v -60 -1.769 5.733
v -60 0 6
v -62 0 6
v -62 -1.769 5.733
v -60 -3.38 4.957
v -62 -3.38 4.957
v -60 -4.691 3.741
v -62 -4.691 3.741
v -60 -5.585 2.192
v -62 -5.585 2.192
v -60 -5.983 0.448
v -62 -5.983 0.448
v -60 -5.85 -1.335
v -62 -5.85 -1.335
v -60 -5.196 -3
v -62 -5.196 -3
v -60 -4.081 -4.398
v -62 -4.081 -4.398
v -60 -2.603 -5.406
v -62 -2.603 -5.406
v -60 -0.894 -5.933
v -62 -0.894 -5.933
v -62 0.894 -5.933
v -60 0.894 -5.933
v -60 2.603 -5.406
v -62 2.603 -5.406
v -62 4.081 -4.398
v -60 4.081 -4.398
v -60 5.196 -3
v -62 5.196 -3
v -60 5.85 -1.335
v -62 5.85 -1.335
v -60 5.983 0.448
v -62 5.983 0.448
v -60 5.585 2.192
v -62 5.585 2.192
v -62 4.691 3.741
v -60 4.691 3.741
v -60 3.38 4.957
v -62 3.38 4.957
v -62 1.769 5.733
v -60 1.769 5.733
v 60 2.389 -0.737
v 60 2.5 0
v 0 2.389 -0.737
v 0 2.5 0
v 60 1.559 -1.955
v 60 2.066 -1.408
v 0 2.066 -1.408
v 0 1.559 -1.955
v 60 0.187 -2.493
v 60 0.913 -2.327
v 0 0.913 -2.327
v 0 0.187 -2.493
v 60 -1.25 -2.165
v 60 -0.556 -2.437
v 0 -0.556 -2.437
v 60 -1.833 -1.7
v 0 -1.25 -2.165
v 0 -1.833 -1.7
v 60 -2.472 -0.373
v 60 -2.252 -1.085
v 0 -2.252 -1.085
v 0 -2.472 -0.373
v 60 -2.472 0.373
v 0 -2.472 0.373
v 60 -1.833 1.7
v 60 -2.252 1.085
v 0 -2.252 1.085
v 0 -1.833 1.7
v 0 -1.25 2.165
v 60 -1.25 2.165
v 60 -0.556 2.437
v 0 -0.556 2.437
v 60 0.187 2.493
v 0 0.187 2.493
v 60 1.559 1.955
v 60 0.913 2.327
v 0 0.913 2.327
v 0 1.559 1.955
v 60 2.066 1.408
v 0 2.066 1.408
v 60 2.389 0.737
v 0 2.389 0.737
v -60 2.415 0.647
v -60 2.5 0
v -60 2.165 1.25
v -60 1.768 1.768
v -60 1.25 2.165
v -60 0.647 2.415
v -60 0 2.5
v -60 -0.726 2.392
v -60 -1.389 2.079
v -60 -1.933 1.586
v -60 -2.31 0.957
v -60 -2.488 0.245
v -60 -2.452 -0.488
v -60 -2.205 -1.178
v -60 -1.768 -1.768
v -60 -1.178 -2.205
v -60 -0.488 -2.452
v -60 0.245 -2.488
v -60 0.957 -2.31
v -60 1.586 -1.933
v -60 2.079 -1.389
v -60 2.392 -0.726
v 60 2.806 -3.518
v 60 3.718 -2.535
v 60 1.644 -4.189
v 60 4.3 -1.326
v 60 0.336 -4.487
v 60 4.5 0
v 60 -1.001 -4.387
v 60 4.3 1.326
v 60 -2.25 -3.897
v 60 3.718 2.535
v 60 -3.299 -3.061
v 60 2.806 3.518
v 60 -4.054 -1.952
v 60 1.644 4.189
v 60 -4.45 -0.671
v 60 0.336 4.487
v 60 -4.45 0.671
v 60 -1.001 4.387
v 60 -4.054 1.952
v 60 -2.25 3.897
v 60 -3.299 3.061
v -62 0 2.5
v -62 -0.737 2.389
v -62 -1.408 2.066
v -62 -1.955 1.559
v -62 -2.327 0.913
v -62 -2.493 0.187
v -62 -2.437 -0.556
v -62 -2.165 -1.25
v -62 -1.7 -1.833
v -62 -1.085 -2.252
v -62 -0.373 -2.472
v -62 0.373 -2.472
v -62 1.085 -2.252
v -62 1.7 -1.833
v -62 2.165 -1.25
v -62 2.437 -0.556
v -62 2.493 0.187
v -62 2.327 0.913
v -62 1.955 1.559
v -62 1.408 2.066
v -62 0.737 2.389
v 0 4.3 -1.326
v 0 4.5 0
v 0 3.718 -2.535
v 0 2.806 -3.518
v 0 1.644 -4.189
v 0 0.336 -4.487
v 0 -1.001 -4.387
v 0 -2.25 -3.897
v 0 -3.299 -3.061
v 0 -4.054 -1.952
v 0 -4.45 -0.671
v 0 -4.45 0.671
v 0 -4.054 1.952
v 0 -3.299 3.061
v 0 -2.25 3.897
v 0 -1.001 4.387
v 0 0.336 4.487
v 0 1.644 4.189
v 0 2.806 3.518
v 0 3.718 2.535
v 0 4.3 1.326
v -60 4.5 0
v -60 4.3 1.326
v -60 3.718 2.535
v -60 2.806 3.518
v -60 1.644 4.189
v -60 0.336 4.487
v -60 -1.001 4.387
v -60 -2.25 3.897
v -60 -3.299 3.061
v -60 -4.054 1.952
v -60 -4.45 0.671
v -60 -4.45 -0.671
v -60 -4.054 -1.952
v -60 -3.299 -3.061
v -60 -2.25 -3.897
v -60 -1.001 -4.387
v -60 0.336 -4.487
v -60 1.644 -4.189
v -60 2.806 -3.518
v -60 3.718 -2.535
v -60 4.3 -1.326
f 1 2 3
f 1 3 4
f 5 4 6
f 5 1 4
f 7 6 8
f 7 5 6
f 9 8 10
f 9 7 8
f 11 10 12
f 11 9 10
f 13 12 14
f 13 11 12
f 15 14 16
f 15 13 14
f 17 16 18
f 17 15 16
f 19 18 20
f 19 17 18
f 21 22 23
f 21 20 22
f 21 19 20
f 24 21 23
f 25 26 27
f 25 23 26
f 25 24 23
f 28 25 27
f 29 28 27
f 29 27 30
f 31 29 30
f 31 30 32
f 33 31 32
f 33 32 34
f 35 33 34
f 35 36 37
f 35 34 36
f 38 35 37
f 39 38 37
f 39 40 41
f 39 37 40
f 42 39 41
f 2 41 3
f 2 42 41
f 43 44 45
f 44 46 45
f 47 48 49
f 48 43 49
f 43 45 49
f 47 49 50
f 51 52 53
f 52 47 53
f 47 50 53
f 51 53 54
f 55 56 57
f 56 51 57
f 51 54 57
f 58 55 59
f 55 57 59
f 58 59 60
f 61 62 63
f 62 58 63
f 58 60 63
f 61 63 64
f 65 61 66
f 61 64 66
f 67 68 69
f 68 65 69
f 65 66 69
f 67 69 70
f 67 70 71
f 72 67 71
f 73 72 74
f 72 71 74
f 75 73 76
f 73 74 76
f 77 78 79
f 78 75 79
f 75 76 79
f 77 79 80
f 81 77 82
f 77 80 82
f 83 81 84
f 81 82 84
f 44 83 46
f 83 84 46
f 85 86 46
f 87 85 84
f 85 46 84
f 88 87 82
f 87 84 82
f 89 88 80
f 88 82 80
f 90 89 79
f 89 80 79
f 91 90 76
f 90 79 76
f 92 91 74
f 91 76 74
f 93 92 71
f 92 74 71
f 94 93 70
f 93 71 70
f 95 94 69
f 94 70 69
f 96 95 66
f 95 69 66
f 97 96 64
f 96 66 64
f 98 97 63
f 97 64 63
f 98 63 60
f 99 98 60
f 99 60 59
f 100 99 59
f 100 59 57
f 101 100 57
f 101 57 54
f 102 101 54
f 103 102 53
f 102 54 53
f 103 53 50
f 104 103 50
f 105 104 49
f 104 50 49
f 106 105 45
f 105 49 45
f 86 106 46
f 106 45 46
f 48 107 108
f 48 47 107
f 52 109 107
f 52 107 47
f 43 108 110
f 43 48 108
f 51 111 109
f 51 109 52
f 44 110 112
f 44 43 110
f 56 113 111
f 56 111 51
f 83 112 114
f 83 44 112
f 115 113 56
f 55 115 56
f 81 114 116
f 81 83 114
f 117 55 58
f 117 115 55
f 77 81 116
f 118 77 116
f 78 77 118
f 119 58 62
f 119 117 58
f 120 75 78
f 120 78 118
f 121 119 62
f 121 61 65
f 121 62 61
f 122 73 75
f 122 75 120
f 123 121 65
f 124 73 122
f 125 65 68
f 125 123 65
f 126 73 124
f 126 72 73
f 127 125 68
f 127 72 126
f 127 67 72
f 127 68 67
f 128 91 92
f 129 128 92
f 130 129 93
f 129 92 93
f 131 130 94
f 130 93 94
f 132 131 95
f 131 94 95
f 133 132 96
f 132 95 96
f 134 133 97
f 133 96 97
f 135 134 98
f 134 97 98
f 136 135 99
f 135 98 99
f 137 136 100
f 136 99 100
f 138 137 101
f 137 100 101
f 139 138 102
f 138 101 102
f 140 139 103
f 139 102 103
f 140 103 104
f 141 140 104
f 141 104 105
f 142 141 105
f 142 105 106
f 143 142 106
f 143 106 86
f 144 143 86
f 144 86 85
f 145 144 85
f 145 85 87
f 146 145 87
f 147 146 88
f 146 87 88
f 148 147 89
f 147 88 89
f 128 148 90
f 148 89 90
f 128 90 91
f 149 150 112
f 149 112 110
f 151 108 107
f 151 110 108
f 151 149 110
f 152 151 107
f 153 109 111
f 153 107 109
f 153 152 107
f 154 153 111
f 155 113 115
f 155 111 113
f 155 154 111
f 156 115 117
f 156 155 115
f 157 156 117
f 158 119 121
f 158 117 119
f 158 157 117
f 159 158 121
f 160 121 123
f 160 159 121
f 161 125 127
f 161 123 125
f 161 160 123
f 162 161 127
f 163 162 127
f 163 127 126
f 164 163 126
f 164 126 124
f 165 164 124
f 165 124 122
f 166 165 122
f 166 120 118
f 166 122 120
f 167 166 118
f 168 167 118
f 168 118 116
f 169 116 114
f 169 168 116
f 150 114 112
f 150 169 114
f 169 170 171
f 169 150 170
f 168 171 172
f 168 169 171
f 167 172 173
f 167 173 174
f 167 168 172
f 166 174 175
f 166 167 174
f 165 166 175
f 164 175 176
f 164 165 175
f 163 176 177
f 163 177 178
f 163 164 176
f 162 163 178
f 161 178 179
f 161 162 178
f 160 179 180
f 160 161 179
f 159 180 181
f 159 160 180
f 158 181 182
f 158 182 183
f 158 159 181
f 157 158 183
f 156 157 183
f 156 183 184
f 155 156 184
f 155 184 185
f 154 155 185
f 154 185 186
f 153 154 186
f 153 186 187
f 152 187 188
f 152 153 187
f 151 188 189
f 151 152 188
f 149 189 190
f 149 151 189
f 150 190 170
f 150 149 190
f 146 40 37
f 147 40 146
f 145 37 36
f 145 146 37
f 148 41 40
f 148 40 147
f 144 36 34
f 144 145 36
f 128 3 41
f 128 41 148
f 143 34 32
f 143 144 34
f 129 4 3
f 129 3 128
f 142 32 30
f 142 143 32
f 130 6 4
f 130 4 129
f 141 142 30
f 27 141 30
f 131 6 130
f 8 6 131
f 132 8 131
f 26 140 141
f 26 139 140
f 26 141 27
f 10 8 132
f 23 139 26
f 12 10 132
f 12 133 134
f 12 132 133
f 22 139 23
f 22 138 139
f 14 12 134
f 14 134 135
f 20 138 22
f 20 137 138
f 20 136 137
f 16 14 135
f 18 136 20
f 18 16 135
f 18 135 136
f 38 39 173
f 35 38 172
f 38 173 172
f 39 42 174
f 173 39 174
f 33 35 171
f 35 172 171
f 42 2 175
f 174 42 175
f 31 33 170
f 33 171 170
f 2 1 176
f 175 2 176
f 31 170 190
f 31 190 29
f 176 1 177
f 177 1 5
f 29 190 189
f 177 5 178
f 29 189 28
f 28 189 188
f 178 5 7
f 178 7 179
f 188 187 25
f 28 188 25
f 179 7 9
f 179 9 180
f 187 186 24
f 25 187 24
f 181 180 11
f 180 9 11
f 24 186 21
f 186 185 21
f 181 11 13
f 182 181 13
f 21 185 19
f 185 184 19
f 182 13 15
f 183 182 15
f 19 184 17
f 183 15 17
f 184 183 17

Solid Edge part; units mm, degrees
sketch "Sketch1" plane through (0, 0, 0) normal (1, 0, 0) x (0, 1, 0)
  circle A0 centre (0, 0) radius 4.5
  circle A1 centre (0, 0) radius 2.5
extrude "Protrusion1" add sketch "Sketch1" along normal mid plane 120
sketch "Sketch2" plane through (-60, 0, 0) normal (-1, 0, 0) x (0, 0, 1)
  circle A0 centre (0, 0) radius 2.5
  circle A1 centre (0, 0) radius 6
extrude "Wyciągnięcie_2" add sketch "Sketch2" along normal blind 2
